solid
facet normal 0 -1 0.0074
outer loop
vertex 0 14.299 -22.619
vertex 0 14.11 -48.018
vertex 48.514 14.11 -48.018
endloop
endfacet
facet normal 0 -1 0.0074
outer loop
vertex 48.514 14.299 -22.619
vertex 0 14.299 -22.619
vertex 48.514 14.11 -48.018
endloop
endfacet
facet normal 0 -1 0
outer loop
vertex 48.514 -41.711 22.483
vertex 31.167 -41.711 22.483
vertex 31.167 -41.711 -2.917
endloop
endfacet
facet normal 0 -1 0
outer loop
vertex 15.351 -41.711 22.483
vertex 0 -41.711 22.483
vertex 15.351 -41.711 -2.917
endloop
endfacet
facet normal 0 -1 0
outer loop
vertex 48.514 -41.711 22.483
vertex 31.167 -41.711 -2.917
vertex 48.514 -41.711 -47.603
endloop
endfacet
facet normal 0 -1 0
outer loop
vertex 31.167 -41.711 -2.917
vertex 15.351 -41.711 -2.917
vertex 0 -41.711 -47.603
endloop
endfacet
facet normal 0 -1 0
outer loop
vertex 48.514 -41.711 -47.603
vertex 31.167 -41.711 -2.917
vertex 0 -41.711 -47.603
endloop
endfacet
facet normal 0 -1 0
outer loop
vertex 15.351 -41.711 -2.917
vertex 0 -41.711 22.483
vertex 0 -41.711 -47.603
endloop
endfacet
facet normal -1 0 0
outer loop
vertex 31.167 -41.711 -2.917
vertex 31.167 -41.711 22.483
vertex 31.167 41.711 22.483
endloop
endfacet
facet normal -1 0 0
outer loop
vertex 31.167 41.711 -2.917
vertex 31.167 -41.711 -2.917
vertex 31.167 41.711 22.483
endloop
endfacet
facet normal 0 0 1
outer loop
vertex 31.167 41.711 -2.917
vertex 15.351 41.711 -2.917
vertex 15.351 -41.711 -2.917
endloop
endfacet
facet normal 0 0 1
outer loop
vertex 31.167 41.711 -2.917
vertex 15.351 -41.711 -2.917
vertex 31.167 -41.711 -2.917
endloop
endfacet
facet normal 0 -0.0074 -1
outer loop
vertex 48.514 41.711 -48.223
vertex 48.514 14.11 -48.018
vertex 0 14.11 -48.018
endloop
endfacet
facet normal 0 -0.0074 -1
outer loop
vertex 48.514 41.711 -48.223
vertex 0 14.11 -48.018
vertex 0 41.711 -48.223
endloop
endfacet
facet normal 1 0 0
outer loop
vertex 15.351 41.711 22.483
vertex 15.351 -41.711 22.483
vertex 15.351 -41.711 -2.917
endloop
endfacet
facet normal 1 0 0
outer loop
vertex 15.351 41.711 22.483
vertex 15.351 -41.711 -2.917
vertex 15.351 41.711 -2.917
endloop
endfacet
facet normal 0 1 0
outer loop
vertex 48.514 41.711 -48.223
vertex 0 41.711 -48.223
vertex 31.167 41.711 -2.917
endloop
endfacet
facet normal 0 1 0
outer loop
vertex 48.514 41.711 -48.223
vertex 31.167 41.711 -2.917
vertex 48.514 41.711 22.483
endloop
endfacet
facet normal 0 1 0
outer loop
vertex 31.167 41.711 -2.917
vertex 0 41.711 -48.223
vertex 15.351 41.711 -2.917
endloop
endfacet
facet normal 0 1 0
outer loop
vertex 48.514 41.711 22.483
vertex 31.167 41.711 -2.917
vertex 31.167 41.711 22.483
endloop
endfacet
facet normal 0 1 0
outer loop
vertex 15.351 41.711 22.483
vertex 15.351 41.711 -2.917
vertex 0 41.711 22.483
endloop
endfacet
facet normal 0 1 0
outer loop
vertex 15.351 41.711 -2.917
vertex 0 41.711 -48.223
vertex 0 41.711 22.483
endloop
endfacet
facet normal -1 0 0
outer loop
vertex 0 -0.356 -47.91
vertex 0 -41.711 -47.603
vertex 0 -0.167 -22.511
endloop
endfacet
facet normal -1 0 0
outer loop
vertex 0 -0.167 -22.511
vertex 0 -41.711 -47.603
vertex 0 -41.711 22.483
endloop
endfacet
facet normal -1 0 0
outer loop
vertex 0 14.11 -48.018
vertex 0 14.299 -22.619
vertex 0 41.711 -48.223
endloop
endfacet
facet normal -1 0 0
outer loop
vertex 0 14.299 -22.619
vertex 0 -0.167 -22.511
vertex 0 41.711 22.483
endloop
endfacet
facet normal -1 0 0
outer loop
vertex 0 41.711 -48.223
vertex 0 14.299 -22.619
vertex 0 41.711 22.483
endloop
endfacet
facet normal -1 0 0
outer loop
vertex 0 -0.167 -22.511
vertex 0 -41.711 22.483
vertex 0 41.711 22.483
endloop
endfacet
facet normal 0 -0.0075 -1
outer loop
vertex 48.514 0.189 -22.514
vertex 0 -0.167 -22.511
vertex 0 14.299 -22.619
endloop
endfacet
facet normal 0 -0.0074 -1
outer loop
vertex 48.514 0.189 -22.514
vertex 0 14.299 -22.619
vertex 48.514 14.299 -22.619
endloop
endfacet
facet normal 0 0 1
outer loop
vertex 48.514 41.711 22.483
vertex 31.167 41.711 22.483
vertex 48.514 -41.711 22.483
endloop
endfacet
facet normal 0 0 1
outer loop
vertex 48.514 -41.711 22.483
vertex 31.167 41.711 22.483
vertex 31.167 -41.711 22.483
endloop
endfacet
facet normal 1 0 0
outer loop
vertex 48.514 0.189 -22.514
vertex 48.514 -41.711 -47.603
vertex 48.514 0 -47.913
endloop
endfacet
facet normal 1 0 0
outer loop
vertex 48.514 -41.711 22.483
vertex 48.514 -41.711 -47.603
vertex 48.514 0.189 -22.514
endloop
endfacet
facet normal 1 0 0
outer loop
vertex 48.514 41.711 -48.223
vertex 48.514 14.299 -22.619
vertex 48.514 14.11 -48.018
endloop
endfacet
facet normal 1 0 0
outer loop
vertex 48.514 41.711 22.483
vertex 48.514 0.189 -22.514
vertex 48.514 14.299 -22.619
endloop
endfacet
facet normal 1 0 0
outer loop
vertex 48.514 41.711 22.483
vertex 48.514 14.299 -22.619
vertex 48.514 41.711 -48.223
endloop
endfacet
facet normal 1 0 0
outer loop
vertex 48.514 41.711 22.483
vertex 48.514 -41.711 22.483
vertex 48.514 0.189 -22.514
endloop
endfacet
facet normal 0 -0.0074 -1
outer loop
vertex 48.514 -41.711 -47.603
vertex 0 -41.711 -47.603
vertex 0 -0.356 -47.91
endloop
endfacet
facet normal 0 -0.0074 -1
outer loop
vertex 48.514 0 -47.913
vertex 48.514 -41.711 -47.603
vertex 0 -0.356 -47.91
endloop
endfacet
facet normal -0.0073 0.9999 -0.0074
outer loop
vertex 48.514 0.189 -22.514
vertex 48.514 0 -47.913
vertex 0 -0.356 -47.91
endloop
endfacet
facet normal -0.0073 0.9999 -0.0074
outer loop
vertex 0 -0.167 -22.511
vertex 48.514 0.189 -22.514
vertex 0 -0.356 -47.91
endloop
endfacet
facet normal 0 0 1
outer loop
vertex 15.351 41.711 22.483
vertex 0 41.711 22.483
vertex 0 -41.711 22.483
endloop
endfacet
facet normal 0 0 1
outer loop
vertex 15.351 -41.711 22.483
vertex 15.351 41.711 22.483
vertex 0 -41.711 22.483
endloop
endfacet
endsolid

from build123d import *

# Parameters (mm, degrees)
F1_DEPTH = 48.514
F2_W     = 15.8159341663
F2_H     = 83.4212787449
F3_DEPTH = 25.4
F5_DEPTH = 25.4


with BuildPart() as f1:
    # F0 (on Right) → F1 (new body)
    with BuildSketch(Plane.YZ):
        Polygon((-41.7106375098, 22.4834308028), (-41.7106375098, -47.6028472185), (41.7106412351, -48.2230819762), (41.7106412351, 22.4834308028), align=None)
    extrude(amount=F1_DEPTH)

    # F2 (on face) → F3 (cut)
    with BuildSketch(Plane.XY.offset(22.4834308028)):
        with Locations((23.2587223873, 1.8626e-06)):
            Rectangle(F2_W, F2_H)
    extrude(amount=-F3_DEPTH, mode=Mode.SUBTRACT)

    # F4 (on face) → F5 (cut)
    with BuildSketch(Plane(origin=(0, -0.3562117937, -47.9103161593), x_dir=(1, 0, 0), z_dir=(0, -0.0074347651, -0.9999723618))):
        Polygon((48.514, -14.4669022411), (48.514, -0.3562235017), (0, 0), (0, -0.3562235017), (0, -14.4669022411), align=None)
    extrude(amount=-F5_DEPTH, mode=Mode.SUBTRACT)


solid = f1.part
